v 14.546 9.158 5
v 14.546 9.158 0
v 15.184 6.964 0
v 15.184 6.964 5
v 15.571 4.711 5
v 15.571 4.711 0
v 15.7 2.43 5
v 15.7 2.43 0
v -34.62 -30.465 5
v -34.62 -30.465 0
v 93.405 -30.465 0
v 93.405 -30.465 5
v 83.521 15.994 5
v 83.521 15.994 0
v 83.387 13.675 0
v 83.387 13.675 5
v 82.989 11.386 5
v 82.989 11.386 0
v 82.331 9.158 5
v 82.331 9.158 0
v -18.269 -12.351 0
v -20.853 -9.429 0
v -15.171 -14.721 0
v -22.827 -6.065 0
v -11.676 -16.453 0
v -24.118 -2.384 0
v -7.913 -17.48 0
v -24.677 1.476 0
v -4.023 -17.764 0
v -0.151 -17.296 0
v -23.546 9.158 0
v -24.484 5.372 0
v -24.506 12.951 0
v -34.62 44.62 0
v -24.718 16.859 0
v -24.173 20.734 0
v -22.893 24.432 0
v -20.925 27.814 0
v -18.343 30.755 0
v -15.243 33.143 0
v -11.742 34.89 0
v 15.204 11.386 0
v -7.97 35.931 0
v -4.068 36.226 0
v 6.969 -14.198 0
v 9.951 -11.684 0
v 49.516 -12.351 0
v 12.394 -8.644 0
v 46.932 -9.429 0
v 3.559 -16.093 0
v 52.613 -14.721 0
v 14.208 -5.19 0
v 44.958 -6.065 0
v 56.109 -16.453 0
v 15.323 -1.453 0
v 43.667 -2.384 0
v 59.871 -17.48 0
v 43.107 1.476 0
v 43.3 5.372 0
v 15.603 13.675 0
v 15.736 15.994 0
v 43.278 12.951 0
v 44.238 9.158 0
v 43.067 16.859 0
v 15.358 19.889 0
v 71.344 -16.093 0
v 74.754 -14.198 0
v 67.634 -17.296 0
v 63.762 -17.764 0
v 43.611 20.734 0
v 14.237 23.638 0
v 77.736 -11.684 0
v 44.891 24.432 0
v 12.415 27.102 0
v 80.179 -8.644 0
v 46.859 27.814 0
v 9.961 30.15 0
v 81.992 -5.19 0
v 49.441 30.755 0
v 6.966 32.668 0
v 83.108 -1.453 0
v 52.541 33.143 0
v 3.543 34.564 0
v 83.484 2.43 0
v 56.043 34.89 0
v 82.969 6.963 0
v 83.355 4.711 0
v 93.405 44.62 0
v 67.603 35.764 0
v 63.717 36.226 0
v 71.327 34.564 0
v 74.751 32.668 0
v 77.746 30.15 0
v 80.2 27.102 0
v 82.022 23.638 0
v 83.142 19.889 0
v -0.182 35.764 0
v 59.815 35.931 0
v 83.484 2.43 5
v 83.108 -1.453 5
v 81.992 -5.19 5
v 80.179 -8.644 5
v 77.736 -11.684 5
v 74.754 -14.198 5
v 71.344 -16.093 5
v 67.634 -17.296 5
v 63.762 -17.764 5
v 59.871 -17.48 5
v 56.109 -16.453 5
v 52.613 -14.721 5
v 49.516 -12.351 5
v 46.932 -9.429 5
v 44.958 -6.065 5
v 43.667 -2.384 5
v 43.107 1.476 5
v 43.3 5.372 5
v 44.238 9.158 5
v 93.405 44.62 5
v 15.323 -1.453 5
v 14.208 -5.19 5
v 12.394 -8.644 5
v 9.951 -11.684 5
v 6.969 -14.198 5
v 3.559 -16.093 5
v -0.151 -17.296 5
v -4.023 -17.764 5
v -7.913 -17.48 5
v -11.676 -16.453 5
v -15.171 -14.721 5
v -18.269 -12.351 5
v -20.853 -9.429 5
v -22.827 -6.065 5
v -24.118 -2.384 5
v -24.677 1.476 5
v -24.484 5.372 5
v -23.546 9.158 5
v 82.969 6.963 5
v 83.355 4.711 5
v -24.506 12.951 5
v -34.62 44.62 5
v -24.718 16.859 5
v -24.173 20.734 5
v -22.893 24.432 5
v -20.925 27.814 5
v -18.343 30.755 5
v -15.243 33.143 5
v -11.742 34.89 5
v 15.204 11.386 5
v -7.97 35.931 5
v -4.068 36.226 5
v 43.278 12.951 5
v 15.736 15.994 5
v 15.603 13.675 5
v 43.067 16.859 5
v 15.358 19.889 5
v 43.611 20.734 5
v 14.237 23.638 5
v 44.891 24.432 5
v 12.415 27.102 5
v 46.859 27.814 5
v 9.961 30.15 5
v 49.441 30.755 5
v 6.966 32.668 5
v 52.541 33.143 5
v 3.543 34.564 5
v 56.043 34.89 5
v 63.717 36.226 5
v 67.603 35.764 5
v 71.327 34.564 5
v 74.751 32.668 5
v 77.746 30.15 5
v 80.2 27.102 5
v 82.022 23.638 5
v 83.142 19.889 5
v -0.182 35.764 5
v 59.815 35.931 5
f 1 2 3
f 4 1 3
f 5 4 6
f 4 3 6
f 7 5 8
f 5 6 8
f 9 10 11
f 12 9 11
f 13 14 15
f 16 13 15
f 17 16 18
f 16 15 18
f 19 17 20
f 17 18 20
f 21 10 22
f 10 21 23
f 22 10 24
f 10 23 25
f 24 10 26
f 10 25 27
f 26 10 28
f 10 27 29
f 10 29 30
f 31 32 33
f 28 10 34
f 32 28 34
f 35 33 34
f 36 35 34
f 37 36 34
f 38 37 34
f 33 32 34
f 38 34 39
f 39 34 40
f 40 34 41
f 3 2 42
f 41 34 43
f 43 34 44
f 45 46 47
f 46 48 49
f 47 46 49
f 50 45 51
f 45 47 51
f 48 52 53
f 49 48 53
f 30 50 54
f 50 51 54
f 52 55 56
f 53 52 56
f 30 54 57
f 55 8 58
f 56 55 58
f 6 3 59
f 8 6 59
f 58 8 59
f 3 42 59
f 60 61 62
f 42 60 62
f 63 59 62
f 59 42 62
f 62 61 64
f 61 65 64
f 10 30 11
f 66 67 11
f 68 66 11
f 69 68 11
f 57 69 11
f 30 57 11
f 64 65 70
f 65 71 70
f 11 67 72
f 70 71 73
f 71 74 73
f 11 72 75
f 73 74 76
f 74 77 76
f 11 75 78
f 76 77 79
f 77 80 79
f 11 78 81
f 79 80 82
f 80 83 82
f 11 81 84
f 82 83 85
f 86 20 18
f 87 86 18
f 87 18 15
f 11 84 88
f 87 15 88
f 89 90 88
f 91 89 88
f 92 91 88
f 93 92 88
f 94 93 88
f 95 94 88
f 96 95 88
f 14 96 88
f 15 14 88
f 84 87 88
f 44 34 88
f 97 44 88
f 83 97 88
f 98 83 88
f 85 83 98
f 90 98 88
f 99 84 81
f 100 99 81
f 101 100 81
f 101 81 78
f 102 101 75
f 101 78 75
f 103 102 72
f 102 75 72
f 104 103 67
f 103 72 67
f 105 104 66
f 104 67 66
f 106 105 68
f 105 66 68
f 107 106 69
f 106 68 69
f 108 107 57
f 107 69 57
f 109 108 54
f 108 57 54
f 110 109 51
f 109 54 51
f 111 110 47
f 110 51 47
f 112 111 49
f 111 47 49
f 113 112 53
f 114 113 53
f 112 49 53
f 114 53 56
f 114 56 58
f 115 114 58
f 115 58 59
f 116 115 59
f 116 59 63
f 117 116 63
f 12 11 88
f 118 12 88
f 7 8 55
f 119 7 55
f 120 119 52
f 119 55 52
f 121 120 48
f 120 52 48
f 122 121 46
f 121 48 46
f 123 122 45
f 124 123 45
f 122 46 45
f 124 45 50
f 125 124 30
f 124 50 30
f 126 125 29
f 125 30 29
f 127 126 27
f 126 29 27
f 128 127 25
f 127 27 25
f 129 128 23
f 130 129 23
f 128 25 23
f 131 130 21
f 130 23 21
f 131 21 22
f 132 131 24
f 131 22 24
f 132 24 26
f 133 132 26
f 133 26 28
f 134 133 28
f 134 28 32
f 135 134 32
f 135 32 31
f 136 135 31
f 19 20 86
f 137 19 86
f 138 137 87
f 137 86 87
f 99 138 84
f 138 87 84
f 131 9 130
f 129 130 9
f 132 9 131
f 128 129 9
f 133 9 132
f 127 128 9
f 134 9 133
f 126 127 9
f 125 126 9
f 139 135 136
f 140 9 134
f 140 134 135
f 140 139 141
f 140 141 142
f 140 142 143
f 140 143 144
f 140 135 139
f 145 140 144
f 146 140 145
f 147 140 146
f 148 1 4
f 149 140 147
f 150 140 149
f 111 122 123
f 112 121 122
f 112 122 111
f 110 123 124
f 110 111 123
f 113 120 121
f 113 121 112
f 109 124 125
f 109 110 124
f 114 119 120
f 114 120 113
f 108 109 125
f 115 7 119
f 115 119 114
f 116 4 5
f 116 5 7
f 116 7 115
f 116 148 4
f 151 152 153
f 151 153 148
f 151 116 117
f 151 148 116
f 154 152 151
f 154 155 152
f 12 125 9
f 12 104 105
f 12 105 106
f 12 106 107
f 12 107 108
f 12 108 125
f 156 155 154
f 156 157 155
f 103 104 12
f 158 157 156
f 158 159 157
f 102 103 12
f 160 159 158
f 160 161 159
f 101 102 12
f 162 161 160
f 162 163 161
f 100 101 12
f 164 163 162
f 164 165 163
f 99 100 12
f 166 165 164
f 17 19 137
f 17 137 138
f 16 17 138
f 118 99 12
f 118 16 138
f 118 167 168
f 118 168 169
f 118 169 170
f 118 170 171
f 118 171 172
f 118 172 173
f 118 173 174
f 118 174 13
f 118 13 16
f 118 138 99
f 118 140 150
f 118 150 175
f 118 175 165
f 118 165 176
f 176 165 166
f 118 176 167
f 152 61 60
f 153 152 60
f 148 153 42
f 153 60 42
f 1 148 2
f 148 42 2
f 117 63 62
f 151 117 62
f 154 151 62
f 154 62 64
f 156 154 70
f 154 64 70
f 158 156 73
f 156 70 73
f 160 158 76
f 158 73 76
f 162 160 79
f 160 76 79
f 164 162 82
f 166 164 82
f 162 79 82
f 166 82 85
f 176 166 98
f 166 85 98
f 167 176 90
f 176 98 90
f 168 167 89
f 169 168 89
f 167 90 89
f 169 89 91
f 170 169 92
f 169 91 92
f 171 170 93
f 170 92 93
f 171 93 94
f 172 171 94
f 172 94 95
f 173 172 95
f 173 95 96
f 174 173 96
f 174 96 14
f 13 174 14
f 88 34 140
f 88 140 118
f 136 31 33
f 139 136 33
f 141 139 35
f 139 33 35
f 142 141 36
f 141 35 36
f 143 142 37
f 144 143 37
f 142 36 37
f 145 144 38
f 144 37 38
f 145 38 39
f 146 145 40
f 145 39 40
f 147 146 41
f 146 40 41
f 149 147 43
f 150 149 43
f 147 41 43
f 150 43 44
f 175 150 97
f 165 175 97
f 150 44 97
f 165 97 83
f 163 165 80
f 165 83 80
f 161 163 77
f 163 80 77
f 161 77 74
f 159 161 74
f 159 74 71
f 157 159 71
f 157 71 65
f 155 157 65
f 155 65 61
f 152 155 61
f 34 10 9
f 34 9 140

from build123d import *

# Parameters (mm, degrees)
SKETCH1_W           = 64.012274628
SKETCH1_H           = 75.085000506
BOSS_EXTRUDE1_DEPTH = 5


with BuildPart() as part:
    # Sketch1 → Boss-Extrude1 (new body)
    # profile 1 of 2: a face of its own
    with BuildSketch(Plane.XY):
        with Locations((61.398411242, 7.077500224)):
            Rectangle(SKETCH1_W, SKETCH1_H)
        with BuildLine():
            ThreePointArc((83.484398078, 2.429730903), (59.871437613, -17.479677368), (44.238109553, 9.157805497))
            ThreePointArc((44.238109553, 9.157805497), (59.81501285, 35.930775127), (83.520814038, 15.994205484))
            ThreePointArc((83.520814038, 15.994205484), (83.22114917, 12.52456978), (82.331029644, 9.157693158))
            ThreePointArc((82.331029644, 9.157693158), (83.193968093, 5.842784333), (83.484398078, 2.429730903))
        make_face(mode=Mode.SUBTRACT)
    # profile 2 of 2: a face of its own
    with BuildSketch(Plane.XY):
        with Locations((-2.613863386, 7.077500224)):
            Rectangle(SKETCH1_W, SKETCH1_H)
        with BuildLine():
            ThreePointArc((15.69984642, 2.429730903), (-7.913055331, -17.479687433), (-23.546481788, 9.157693158))
            ThreePointArc((-23.546481788, 9.157693158), (-7.969677608, 35.930764895), (15.736182375, 15.994205484))
            ThreePointArc((15.736182375, 15.994205484), (15.436527739, 12.524628574), (14.546438303, 9.157805497))
            ThreePointArc((14.546438303, 9.157805497), (15.409406369, 5.842843047), (15.69984642, 2.429730903))
        make_face(mode=Mode.SUBTRACT)
    extrude(amount=BOSS_EXTRUDE1_DEPTH)


solid = part.part
